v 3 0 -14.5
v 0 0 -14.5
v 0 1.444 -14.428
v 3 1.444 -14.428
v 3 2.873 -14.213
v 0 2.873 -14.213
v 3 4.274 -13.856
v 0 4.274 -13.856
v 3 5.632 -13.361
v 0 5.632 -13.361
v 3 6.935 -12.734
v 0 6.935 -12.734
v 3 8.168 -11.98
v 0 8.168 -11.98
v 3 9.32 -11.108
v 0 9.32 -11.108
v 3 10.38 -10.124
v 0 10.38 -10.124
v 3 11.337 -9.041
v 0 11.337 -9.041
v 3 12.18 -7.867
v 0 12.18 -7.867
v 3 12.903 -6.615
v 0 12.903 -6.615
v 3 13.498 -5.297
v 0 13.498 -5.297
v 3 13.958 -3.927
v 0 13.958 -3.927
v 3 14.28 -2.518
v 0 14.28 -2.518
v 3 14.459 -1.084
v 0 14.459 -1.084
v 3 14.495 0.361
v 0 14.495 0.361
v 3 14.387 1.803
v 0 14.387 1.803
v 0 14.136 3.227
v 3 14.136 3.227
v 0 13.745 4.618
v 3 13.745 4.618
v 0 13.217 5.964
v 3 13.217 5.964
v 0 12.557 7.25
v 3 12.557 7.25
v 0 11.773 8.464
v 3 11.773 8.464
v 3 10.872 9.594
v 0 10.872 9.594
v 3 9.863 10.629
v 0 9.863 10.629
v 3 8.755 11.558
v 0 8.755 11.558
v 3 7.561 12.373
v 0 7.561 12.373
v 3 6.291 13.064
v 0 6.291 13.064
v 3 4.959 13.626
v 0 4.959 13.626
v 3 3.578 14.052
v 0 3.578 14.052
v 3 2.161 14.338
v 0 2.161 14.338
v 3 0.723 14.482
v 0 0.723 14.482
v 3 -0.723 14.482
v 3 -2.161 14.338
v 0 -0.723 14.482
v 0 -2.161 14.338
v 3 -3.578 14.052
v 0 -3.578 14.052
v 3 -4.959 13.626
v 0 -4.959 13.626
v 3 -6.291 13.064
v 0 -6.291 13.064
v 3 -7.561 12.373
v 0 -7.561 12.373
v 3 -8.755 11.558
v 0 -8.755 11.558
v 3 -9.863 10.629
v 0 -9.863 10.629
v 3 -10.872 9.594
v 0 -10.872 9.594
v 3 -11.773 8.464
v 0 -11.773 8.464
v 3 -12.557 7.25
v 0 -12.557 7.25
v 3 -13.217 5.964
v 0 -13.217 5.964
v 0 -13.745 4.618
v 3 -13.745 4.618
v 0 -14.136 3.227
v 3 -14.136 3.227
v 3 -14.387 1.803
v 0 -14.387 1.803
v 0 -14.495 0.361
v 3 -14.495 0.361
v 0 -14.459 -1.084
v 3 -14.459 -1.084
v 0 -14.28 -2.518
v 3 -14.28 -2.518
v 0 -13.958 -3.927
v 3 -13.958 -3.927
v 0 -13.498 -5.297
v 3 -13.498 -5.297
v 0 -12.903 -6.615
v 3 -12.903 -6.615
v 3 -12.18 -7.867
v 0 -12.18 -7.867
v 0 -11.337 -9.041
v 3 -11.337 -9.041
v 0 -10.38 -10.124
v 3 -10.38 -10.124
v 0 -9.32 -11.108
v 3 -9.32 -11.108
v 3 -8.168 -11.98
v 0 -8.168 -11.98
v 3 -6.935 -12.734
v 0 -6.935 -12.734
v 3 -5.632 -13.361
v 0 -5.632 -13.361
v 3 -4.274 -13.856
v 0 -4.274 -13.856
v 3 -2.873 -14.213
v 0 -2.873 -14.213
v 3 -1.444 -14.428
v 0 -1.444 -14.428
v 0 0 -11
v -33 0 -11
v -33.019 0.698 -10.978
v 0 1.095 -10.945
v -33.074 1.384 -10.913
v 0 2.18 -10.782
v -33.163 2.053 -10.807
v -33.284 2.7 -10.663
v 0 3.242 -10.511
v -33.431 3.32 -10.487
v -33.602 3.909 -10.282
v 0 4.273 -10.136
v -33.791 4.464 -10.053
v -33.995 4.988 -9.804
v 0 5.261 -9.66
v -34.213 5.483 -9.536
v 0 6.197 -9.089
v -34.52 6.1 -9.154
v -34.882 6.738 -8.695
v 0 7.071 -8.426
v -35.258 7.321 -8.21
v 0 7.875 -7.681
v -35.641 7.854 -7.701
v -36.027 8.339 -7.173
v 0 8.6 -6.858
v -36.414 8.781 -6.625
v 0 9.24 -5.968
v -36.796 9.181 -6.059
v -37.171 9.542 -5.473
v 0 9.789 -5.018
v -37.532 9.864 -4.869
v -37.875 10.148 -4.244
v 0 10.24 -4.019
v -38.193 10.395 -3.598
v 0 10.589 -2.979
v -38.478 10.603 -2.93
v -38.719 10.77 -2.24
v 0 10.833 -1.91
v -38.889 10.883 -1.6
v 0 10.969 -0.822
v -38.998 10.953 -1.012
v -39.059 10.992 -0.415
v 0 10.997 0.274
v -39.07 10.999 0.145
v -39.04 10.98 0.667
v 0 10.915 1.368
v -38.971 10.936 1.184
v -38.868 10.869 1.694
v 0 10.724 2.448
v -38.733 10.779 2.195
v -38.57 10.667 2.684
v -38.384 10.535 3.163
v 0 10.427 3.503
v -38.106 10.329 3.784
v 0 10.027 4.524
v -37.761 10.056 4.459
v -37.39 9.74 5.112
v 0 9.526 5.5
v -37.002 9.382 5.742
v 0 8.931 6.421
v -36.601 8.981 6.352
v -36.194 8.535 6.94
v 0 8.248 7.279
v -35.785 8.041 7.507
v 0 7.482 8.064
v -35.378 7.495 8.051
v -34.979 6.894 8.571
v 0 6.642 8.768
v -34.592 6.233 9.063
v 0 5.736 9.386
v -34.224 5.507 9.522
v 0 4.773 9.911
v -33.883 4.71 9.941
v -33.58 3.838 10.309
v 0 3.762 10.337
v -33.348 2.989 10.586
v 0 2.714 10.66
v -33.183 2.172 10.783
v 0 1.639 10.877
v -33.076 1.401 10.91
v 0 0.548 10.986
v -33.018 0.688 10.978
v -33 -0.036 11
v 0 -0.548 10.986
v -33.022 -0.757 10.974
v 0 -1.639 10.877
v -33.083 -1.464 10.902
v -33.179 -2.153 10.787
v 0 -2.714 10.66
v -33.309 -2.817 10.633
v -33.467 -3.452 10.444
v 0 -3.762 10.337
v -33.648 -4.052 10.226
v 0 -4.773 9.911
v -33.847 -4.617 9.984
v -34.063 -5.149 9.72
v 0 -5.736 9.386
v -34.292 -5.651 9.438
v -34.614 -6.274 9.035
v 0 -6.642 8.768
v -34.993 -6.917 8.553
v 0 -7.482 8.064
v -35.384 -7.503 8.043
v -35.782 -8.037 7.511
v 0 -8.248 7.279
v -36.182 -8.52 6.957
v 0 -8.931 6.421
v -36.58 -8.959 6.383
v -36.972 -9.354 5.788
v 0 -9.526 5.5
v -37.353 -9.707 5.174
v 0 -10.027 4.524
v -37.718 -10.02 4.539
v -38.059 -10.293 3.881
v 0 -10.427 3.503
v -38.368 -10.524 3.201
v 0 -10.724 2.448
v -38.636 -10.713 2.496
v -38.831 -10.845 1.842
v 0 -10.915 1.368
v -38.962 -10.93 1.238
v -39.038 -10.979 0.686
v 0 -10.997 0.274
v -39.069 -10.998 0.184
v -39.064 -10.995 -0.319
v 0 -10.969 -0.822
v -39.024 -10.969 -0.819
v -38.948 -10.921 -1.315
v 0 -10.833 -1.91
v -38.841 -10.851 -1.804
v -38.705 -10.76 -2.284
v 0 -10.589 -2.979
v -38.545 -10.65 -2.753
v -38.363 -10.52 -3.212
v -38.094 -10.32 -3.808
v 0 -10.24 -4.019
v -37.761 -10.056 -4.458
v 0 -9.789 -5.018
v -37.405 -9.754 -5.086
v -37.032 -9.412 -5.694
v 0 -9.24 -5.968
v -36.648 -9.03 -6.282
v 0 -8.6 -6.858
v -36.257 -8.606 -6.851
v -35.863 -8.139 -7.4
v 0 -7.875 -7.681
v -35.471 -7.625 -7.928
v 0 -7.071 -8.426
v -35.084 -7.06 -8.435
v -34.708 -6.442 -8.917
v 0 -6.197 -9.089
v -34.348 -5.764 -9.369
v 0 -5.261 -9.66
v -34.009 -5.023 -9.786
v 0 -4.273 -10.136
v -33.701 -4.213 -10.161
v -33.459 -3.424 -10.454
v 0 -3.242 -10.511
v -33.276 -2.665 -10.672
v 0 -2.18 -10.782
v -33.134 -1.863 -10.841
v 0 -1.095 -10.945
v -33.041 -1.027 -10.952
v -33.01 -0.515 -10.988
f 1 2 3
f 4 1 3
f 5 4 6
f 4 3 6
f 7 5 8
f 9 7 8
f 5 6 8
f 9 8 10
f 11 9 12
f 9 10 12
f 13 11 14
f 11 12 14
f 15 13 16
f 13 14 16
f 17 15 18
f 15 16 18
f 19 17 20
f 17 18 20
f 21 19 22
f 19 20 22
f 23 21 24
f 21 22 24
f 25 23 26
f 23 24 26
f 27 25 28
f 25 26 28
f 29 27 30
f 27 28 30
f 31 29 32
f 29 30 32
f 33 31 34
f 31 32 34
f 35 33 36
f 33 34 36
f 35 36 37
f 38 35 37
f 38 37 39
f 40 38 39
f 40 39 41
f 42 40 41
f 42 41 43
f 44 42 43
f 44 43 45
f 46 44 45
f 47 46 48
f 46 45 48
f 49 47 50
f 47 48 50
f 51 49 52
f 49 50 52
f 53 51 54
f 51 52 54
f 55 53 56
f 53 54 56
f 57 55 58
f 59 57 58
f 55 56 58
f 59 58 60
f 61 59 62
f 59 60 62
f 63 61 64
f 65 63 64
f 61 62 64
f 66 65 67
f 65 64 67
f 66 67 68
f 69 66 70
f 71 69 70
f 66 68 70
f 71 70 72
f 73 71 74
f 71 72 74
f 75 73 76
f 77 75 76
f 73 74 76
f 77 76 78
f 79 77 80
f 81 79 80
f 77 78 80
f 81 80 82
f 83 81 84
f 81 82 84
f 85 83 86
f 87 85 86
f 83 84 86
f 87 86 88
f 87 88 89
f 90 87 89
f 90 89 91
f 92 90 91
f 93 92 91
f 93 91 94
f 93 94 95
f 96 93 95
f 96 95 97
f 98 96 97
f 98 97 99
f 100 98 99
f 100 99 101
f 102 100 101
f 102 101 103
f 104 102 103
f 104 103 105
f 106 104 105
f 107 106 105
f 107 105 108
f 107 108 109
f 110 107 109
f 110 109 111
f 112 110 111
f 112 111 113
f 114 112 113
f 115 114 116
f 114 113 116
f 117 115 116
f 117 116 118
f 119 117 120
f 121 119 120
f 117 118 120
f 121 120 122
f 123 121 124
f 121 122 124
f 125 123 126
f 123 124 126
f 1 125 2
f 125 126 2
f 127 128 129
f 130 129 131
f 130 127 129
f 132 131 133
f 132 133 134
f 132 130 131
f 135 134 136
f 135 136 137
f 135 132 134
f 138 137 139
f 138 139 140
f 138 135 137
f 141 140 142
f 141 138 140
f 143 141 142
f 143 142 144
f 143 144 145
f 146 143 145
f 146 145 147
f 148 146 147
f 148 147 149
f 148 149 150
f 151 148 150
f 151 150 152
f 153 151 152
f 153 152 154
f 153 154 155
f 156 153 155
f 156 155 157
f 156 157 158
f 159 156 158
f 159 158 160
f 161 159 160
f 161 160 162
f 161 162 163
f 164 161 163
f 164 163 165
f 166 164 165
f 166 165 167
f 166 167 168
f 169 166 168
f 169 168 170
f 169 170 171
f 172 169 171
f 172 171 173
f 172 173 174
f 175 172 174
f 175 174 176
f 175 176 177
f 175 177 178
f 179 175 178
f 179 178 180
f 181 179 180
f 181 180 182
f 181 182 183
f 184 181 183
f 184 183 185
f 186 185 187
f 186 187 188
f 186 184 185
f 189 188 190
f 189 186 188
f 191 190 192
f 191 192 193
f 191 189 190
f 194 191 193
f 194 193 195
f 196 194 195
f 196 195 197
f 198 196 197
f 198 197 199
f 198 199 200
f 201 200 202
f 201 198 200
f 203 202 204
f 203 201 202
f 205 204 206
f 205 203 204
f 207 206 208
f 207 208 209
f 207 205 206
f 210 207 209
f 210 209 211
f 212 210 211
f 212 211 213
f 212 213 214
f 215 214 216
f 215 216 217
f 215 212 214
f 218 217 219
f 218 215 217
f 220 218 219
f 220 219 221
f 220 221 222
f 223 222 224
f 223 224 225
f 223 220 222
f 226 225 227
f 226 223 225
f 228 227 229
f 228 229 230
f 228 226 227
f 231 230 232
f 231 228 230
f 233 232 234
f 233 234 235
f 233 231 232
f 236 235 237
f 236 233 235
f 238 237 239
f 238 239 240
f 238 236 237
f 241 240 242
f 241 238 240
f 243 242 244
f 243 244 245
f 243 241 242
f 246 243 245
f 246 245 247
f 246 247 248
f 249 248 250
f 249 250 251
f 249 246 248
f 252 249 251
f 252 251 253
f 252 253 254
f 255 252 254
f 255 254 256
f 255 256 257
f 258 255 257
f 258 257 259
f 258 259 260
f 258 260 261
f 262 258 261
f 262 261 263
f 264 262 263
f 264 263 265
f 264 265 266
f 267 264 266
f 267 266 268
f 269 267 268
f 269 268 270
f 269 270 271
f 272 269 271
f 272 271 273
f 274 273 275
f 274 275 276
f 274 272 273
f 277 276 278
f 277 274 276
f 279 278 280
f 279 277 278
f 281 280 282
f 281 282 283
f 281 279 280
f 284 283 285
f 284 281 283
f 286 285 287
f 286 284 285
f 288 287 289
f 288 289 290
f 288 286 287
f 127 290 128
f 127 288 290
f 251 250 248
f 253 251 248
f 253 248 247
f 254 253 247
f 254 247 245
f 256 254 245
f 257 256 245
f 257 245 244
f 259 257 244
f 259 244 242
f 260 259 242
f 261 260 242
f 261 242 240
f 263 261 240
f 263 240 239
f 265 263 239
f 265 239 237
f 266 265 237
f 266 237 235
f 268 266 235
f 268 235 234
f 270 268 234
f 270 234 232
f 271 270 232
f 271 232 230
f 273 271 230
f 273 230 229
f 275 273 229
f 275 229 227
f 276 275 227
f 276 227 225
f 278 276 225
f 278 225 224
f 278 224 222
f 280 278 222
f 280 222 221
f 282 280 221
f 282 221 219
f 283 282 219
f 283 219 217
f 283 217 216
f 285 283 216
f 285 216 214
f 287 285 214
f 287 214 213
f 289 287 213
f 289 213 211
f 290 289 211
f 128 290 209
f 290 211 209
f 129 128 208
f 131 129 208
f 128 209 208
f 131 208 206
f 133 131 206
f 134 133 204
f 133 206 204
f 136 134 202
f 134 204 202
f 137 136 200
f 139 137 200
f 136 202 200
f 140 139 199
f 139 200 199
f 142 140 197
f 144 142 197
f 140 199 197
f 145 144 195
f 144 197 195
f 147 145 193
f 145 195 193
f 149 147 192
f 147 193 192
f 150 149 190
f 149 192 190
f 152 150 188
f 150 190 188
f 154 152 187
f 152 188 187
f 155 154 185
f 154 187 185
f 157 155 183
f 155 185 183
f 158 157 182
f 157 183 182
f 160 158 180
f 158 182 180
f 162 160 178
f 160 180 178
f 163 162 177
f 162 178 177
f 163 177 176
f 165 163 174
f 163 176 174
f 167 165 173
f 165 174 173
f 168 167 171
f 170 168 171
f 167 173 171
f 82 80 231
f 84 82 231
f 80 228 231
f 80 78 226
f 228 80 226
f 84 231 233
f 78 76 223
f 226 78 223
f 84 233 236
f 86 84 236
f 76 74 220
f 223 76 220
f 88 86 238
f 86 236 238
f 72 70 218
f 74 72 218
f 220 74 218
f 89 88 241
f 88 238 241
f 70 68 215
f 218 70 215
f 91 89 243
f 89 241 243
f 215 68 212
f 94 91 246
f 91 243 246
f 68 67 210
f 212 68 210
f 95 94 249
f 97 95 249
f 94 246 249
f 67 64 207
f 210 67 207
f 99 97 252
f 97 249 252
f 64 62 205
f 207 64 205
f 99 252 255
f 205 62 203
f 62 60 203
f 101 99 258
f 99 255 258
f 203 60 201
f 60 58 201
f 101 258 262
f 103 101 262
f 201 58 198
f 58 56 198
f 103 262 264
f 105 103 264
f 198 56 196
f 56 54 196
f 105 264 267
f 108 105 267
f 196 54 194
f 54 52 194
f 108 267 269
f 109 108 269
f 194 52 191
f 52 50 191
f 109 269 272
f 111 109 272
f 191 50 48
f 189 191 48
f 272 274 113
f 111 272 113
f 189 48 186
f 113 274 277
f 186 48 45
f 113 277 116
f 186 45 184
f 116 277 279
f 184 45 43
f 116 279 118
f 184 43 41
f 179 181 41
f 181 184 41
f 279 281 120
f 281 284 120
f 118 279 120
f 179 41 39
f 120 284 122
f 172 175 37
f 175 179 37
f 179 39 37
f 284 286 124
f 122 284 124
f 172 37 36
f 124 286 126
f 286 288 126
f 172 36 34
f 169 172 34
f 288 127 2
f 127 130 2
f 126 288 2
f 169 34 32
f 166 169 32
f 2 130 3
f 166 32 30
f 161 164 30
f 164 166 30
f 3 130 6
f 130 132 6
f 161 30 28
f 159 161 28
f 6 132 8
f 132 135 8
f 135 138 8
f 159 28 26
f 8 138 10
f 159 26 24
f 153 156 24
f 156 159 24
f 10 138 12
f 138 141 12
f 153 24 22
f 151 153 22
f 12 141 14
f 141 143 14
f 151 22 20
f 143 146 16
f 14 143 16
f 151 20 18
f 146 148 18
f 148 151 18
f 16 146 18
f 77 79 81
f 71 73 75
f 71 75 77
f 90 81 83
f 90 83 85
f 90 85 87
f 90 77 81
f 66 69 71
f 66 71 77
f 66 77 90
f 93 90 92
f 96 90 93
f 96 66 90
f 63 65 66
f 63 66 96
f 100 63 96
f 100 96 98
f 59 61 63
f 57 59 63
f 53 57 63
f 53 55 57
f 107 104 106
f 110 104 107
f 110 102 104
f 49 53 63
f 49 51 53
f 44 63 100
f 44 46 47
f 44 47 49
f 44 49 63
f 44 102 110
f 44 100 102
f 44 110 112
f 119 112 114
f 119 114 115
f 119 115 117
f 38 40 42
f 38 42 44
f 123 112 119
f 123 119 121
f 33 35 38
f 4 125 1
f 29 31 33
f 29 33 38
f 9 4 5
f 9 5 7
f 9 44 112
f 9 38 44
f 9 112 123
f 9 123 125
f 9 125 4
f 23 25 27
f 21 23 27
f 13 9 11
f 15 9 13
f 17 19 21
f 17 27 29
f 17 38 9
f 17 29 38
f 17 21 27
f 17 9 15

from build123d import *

# Parameters (mm, degrees)
ESBO_O1_R             = 11
EXTRUS_O1_DEPTH       = 50
ESBO_O2_R             = 13
CORTE_EXTRUS_O1_DEPTH = 40
ESBO_O3_R             = 14.5
EXTRUS_O2_DEPTH       = 3


with BuildPart() as part:
    # Esboço1 → Extrusão1 (new body)
    with BuildSketch(Plane(origin=(0, 0, 0), x_dir=(0, 0, -1), z_dir=(1, 0, 0))):
        Circle(ESBO_O1_R)
    extrude(amount=-EXTRUS_O1_DEPTH)

    # Esboço2 → Corte-extrusão1 (cut, symmetric)
    with BuildSketch(Plane.XY):
        with Locations((-46, 0)):
            Circle(ESBO_O2_R)
    extrude(amount=CORTE_EXTRUS_O1_DEPTH, both=True, mode=Mode.SUBTRACT)

    # Esboço3 → Extrusão2 (add)
    with BuildSketch(Plane(origin=(0, 0, 0), x_dir=(0, 0, -1), z_dir=(1, 0, 0))):
        Circle(ESBO_O3_R)
    extrude(amount=EXTRUS_O2_DEPTH)


solid = part.part
